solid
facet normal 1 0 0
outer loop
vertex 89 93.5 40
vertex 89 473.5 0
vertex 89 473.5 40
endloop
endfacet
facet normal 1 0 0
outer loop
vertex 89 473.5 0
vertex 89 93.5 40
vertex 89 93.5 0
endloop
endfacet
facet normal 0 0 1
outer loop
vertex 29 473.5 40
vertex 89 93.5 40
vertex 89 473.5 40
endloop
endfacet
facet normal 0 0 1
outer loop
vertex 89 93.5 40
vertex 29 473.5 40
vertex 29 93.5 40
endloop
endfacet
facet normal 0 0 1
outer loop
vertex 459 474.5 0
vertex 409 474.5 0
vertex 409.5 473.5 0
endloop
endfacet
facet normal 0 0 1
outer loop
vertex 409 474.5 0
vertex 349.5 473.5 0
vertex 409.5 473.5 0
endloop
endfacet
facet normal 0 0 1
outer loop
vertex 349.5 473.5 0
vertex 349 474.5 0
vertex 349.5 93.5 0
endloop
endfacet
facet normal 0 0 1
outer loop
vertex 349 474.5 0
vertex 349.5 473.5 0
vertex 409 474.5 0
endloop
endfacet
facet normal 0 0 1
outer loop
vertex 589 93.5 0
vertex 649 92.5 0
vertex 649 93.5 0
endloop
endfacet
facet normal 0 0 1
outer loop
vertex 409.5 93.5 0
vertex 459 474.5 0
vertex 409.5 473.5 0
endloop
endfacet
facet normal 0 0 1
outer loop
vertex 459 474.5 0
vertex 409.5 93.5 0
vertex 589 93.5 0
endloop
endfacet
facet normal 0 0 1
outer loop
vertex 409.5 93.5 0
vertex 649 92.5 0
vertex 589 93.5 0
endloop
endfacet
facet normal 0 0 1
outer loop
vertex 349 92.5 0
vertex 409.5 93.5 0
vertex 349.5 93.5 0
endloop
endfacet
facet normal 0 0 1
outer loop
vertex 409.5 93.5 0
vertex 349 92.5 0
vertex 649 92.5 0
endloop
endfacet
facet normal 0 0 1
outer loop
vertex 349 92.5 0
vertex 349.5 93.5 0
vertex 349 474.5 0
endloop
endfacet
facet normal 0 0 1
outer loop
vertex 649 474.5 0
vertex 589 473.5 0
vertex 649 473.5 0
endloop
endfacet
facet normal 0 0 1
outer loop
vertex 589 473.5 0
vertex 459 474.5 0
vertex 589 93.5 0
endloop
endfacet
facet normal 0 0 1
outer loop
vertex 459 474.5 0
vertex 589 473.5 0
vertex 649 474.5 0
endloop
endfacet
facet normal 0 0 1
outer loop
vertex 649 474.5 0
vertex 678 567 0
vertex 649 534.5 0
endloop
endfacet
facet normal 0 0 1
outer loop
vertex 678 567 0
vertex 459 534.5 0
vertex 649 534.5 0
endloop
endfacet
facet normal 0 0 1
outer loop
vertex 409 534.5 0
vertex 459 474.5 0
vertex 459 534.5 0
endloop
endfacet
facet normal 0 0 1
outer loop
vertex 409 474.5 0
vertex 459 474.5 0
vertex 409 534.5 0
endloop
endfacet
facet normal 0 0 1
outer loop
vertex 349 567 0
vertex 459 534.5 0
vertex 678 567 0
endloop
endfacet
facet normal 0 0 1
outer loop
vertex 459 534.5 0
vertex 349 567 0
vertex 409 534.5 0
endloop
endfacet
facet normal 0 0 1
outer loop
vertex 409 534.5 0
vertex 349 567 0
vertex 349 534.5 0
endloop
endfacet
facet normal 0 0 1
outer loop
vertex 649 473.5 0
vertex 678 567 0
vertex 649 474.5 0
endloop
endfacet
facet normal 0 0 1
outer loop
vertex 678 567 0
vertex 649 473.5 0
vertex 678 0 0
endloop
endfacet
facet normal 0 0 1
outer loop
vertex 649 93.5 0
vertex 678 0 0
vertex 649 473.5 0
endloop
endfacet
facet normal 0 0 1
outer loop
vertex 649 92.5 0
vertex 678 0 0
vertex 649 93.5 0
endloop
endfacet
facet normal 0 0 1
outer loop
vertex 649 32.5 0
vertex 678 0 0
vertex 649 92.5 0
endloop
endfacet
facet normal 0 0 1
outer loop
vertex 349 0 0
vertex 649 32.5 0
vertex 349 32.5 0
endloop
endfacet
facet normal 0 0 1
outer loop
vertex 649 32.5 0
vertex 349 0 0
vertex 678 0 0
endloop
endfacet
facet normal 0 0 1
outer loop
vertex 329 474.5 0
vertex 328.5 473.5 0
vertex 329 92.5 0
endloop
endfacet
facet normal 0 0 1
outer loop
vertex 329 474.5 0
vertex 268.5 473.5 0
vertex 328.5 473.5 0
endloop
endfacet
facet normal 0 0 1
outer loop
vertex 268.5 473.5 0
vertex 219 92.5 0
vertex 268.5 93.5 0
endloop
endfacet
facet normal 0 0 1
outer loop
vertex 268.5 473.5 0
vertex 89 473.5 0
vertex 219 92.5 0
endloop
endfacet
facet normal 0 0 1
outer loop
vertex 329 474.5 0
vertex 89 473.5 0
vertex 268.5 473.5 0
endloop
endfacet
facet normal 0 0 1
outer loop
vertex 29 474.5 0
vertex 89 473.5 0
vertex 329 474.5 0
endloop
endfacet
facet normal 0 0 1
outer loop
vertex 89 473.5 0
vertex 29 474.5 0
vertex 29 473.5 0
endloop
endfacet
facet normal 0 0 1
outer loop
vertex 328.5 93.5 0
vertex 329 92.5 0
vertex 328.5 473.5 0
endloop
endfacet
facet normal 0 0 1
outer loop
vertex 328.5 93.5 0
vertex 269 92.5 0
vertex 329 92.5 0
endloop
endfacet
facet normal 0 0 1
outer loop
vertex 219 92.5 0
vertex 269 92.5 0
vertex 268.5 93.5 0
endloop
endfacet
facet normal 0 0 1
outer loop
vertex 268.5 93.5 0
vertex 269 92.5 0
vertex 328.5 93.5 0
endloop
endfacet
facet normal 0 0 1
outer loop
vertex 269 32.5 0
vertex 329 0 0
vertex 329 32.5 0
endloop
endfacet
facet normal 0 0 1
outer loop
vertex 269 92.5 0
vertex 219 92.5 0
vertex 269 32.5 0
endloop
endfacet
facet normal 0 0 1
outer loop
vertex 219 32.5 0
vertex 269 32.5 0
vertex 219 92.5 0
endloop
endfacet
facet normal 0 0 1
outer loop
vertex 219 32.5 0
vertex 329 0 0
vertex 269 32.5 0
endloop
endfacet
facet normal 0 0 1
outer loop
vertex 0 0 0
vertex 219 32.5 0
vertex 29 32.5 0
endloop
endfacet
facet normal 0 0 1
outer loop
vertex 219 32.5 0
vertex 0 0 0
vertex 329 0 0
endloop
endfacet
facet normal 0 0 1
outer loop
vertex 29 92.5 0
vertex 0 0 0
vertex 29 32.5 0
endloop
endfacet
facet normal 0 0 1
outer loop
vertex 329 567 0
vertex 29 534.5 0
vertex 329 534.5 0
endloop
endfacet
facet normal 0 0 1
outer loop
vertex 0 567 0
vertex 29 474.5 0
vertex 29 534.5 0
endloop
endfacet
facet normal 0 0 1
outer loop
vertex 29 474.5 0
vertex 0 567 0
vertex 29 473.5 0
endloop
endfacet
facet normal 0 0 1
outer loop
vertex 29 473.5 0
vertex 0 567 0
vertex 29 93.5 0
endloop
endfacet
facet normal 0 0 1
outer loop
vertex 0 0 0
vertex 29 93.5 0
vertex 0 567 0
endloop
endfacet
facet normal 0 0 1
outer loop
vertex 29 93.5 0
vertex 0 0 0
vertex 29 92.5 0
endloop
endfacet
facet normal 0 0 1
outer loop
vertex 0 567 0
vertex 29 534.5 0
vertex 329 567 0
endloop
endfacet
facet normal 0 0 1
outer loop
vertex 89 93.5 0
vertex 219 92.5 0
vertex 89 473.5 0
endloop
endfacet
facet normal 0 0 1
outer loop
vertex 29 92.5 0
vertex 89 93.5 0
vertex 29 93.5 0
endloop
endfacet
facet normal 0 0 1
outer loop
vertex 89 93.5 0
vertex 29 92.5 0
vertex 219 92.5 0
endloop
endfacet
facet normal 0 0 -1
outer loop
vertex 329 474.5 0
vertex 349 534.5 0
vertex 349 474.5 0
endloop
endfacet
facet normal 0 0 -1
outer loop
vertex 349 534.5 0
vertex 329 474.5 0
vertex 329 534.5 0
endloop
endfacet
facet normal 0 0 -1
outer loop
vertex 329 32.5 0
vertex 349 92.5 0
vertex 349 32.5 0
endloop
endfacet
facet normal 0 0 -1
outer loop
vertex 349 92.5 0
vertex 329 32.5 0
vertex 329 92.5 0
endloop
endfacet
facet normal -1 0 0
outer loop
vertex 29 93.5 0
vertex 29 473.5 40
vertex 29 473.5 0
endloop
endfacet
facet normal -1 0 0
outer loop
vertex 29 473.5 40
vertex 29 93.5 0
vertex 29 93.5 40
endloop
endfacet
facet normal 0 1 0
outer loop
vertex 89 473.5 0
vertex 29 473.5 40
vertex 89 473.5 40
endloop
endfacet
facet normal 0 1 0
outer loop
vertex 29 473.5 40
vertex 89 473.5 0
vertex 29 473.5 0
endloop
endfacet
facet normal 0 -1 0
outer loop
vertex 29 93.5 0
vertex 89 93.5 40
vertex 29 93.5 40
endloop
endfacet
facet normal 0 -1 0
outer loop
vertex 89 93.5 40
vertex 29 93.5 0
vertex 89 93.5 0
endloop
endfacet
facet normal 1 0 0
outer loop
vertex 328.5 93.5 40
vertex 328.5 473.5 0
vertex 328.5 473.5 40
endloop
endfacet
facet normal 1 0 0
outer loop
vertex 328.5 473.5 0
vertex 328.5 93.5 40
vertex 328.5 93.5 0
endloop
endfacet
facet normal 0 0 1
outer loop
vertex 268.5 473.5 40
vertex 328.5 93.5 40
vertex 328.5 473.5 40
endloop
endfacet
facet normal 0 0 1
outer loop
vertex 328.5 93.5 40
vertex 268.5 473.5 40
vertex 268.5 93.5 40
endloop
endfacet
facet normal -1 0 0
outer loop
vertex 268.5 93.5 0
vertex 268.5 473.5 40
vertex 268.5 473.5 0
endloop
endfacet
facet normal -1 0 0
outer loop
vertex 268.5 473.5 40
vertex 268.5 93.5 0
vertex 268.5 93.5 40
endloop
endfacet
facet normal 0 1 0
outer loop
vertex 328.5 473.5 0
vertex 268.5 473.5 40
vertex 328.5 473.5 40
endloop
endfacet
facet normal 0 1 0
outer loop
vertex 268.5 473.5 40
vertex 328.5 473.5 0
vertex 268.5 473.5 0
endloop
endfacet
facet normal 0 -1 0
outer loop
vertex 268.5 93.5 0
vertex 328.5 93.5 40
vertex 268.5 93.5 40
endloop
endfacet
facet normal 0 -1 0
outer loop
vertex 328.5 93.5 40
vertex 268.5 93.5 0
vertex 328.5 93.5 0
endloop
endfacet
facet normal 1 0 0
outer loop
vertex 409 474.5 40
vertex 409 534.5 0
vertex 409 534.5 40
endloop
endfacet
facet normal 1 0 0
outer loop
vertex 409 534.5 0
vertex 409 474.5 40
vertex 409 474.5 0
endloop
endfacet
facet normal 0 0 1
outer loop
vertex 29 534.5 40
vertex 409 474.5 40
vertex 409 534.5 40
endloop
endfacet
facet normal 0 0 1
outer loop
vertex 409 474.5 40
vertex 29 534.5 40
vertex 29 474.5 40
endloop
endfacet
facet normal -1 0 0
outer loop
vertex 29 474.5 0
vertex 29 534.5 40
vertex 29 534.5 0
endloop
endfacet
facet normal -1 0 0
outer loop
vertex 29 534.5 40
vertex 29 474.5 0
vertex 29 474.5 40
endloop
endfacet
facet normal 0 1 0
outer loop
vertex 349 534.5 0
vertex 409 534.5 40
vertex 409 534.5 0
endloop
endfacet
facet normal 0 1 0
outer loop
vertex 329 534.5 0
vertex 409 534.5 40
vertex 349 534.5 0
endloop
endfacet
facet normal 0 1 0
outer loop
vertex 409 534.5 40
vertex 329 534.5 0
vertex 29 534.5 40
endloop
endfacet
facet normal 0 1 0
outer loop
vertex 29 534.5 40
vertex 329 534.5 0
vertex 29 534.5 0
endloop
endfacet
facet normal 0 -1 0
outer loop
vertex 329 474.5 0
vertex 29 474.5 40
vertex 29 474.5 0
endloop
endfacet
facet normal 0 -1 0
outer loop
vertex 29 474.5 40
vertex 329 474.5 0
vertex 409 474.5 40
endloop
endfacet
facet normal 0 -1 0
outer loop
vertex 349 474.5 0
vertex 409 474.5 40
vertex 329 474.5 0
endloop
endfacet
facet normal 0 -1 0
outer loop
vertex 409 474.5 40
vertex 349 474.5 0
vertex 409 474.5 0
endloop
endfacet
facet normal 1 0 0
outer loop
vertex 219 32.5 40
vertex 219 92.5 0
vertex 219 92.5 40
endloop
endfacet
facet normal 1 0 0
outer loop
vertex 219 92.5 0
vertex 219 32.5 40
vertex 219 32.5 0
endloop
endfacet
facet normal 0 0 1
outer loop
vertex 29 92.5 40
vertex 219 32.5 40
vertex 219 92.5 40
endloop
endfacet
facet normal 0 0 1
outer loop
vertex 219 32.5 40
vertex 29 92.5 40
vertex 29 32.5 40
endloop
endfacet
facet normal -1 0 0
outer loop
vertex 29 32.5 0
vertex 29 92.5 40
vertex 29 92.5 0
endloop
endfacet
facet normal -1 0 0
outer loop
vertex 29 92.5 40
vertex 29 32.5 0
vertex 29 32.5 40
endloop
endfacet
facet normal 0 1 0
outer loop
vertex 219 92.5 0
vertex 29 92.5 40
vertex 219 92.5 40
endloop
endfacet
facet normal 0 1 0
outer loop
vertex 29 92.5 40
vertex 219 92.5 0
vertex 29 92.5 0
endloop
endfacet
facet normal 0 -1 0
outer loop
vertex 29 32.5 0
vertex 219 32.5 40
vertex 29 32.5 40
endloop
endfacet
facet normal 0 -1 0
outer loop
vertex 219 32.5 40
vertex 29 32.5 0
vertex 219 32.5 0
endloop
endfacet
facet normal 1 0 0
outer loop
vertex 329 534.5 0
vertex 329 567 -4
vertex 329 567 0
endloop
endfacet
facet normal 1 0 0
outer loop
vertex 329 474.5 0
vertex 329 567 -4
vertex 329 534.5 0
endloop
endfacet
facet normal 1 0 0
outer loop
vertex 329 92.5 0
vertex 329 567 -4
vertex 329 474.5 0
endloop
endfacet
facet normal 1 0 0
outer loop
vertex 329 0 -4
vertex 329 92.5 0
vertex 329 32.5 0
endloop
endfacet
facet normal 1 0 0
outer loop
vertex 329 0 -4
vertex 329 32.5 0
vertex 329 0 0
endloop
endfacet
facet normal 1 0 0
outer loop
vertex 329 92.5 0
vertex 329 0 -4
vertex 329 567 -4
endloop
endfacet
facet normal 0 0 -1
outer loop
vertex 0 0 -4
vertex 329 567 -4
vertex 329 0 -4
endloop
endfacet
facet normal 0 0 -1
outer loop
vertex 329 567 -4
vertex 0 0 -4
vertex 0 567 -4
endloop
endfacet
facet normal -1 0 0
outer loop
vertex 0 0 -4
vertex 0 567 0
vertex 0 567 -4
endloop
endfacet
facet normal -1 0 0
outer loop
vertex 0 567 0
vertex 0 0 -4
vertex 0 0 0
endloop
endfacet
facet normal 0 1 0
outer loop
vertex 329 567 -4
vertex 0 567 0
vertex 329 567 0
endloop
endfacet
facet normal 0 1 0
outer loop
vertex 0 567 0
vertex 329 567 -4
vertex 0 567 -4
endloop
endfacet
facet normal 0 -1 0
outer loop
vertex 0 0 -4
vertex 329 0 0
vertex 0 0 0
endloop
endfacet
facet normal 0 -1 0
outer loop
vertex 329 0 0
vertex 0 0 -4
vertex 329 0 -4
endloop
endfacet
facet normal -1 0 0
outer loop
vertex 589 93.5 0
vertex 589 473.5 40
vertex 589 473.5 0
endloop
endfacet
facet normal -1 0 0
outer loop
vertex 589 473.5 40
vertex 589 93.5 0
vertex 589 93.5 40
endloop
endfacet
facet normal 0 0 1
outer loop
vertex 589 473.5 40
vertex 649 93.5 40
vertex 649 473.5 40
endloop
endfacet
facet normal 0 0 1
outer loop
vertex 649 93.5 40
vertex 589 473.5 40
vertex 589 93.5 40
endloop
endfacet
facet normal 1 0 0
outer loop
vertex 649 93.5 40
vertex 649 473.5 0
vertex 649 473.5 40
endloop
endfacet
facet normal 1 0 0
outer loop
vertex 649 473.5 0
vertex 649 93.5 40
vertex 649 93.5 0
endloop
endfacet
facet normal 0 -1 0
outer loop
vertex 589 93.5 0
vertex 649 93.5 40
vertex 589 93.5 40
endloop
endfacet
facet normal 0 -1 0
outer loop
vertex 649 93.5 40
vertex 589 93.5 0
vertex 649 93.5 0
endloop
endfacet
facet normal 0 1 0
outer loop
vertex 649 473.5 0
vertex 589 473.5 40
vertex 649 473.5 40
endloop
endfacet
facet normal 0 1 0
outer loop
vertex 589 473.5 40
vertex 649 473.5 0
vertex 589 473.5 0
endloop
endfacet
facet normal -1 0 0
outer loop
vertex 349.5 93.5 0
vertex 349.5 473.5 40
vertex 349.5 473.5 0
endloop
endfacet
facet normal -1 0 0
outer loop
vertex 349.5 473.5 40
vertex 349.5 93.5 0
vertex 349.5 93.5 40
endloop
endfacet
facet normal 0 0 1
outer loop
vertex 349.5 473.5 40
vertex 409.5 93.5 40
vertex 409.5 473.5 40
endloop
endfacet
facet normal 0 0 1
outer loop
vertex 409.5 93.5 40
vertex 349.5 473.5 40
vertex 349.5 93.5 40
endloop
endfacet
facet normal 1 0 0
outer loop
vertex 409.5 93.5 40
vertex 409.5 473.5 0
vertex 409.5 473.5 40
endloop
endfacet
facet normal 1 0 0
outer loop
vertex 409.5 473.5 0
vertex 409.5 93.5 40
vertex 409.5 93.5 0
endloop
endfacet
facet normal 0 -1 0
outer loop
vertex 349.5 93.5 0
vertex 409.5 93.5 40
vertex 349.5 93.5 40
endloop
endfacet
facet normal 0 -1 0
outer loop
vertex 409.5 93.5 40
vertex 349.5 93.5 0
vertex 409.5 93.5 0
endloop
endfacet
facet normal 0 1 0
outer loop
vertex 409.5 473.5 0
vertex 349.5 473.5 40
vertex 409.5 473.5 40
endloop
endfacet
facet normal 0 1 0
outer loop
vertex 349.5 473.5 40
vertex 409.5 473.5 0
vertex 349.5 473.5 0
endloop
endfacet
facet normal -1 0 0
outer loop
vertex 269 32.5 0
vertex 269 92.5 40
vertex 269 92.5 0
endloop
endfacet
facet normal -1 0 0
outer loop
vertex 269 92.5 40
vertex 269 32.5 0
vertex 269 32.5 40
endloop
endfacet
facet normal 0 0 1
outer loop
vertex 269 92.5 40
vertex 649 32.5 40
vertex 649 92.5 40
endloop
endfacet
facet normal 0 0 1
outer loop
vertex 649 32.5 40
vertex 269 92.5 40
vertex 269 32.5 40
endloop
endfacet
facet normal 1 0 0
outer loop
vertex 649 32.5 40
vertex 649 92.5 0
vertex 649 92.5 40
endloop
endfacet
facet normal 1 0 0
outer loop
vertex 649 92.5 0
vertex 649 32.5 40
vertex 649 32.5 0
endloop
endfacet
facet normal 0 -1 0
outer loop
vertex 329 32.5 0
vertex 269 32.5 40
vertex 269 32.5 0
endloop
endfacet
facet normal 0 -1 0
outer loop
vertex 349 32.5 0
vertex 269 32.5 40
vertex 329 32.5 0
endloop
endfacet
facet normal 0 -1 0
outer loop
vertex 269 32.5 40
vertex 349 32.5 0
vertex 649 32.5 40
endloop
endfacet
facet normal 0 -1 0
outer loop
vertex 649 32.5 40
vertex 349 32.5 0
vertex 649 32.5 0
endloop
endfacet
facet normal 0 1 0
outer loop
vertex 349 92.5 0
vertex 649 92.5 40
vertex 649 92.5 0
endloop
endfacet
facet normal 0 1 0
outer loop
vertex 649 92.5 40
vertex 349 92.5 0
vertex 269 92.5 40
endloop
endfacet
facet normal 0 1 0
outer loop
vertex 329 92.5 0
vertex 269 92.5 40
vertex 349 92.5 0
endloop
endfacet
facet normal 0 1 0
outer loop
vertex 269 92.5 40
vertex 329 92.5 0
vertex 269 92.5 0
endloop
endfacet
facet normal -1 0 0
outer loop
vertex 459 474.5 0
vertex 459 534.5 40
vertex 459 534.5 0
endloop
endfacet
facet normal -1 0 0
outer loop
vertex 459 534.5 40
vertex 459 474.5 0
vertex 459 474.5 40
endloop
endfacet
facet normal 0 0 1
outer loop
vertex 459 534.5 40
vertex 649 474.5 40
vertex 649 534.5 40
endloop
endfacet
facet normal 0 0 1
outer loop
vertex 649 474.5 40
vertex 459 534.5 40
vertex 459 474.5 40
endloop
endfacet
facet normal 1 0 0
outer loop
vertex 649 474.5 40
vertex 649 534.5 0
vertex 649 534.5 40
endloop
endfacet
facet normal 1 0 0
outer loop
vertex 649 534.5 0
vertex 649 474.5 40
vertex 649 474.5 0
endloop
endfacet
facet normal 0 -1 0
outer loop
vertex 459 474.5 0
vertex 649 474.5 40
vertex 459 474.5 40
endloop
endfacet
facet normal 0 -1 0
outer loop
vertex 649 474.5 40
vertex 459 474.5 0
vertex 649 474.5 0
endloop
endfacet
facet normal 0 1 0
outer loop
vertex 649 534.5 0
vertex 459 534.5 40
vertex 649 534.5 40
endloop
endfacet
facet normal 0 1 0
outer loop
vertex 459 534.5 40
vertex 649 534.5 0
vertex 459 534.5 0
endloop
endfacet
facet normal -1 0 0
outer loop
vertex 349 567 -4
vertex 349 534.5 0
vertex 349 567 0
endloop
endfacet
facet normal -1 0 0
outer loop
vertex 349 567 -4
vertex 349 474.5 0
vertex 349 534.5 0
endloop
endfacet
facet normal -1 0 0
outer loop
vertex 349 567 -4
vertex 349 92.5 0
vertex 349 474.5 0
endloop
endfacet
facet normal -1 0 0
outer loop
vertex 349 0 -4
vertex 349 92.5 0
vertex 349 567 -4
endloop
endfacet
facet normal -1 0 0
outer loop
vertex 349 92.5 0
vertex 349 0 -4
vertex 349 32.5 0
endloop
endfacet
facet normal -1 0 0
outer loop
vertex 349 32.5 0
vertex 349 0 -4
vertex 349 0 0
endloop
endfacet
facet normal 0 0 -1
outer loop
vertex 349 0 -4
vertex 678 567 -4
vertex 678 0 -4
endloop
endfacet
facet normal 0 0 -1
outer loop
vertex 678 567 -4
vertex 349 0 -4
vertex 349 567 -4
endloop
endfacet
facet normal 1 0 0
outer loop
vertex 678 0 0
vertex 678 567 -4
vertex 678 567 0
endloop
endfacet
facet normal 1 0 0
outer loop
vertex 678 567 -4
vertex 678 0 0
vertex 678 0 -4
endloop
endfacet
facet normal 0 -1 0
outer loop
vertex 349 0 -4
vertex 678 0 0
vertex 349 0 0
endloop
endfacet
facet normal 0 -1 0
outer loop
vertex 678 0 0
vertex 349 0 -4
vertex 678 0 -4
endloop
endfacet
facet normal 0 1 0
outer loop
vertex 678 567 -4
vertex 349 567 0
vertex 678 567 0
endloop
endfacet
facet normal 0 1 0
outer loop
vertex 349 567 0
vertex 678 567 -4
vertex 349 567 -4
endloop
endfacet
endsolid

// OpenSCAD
// Schweißtisch geschlossen

vkr_h=40;
vkr_l=380;
vkr_b=60;

p_h=4;
p_l=567;
p_b=329;

clear=1;
dist=20;

module mod() {
    // 1. bar
    color( "Olive", 1.0 ) {
        translate([0.5*vkr_b-clear,(p_l-vkr_l)/2]) {
            cube([vkr_b,vkr_l,vkr_h], 0);
        };
    };

    // 2. bar
    translate([p_b-vkr_b-0.5*clear,(p_l-vkr_l)/2,0]) {
        color( "Lime", 1.0 ) {
            cube([vkr_b,vkr_l,vkr_h], 0);
        };
    };

    // 2. bar
    translate([0.5*vkr_b-clear,p_l/2+vkr_l/2+clear,0]) {
        color( "ForestGreen", 1.0 ) {
            cube([vkr_l,vkr_b,vkr_h], 0);
        };
    };
    
    // 4. bar
    translate([0.5*vkr_b-clear*clear,(p_l-vkr_l)/2-vkr_b-clear,0]) {
        color( "Red", 1.0 ) {
            cube([vkr_l/2,vkr_b,vkr_h], 0);
        };
    };

    // Plate
    translate([0,0,-p_h]) {
        cube([p_b,p_l,p_h], 0);
    };
};


mod();

translate([p_b*2+dist,p_l,0]) {
    rotate(a=180, v=[0,0,1]){
        mod();
    };
};
